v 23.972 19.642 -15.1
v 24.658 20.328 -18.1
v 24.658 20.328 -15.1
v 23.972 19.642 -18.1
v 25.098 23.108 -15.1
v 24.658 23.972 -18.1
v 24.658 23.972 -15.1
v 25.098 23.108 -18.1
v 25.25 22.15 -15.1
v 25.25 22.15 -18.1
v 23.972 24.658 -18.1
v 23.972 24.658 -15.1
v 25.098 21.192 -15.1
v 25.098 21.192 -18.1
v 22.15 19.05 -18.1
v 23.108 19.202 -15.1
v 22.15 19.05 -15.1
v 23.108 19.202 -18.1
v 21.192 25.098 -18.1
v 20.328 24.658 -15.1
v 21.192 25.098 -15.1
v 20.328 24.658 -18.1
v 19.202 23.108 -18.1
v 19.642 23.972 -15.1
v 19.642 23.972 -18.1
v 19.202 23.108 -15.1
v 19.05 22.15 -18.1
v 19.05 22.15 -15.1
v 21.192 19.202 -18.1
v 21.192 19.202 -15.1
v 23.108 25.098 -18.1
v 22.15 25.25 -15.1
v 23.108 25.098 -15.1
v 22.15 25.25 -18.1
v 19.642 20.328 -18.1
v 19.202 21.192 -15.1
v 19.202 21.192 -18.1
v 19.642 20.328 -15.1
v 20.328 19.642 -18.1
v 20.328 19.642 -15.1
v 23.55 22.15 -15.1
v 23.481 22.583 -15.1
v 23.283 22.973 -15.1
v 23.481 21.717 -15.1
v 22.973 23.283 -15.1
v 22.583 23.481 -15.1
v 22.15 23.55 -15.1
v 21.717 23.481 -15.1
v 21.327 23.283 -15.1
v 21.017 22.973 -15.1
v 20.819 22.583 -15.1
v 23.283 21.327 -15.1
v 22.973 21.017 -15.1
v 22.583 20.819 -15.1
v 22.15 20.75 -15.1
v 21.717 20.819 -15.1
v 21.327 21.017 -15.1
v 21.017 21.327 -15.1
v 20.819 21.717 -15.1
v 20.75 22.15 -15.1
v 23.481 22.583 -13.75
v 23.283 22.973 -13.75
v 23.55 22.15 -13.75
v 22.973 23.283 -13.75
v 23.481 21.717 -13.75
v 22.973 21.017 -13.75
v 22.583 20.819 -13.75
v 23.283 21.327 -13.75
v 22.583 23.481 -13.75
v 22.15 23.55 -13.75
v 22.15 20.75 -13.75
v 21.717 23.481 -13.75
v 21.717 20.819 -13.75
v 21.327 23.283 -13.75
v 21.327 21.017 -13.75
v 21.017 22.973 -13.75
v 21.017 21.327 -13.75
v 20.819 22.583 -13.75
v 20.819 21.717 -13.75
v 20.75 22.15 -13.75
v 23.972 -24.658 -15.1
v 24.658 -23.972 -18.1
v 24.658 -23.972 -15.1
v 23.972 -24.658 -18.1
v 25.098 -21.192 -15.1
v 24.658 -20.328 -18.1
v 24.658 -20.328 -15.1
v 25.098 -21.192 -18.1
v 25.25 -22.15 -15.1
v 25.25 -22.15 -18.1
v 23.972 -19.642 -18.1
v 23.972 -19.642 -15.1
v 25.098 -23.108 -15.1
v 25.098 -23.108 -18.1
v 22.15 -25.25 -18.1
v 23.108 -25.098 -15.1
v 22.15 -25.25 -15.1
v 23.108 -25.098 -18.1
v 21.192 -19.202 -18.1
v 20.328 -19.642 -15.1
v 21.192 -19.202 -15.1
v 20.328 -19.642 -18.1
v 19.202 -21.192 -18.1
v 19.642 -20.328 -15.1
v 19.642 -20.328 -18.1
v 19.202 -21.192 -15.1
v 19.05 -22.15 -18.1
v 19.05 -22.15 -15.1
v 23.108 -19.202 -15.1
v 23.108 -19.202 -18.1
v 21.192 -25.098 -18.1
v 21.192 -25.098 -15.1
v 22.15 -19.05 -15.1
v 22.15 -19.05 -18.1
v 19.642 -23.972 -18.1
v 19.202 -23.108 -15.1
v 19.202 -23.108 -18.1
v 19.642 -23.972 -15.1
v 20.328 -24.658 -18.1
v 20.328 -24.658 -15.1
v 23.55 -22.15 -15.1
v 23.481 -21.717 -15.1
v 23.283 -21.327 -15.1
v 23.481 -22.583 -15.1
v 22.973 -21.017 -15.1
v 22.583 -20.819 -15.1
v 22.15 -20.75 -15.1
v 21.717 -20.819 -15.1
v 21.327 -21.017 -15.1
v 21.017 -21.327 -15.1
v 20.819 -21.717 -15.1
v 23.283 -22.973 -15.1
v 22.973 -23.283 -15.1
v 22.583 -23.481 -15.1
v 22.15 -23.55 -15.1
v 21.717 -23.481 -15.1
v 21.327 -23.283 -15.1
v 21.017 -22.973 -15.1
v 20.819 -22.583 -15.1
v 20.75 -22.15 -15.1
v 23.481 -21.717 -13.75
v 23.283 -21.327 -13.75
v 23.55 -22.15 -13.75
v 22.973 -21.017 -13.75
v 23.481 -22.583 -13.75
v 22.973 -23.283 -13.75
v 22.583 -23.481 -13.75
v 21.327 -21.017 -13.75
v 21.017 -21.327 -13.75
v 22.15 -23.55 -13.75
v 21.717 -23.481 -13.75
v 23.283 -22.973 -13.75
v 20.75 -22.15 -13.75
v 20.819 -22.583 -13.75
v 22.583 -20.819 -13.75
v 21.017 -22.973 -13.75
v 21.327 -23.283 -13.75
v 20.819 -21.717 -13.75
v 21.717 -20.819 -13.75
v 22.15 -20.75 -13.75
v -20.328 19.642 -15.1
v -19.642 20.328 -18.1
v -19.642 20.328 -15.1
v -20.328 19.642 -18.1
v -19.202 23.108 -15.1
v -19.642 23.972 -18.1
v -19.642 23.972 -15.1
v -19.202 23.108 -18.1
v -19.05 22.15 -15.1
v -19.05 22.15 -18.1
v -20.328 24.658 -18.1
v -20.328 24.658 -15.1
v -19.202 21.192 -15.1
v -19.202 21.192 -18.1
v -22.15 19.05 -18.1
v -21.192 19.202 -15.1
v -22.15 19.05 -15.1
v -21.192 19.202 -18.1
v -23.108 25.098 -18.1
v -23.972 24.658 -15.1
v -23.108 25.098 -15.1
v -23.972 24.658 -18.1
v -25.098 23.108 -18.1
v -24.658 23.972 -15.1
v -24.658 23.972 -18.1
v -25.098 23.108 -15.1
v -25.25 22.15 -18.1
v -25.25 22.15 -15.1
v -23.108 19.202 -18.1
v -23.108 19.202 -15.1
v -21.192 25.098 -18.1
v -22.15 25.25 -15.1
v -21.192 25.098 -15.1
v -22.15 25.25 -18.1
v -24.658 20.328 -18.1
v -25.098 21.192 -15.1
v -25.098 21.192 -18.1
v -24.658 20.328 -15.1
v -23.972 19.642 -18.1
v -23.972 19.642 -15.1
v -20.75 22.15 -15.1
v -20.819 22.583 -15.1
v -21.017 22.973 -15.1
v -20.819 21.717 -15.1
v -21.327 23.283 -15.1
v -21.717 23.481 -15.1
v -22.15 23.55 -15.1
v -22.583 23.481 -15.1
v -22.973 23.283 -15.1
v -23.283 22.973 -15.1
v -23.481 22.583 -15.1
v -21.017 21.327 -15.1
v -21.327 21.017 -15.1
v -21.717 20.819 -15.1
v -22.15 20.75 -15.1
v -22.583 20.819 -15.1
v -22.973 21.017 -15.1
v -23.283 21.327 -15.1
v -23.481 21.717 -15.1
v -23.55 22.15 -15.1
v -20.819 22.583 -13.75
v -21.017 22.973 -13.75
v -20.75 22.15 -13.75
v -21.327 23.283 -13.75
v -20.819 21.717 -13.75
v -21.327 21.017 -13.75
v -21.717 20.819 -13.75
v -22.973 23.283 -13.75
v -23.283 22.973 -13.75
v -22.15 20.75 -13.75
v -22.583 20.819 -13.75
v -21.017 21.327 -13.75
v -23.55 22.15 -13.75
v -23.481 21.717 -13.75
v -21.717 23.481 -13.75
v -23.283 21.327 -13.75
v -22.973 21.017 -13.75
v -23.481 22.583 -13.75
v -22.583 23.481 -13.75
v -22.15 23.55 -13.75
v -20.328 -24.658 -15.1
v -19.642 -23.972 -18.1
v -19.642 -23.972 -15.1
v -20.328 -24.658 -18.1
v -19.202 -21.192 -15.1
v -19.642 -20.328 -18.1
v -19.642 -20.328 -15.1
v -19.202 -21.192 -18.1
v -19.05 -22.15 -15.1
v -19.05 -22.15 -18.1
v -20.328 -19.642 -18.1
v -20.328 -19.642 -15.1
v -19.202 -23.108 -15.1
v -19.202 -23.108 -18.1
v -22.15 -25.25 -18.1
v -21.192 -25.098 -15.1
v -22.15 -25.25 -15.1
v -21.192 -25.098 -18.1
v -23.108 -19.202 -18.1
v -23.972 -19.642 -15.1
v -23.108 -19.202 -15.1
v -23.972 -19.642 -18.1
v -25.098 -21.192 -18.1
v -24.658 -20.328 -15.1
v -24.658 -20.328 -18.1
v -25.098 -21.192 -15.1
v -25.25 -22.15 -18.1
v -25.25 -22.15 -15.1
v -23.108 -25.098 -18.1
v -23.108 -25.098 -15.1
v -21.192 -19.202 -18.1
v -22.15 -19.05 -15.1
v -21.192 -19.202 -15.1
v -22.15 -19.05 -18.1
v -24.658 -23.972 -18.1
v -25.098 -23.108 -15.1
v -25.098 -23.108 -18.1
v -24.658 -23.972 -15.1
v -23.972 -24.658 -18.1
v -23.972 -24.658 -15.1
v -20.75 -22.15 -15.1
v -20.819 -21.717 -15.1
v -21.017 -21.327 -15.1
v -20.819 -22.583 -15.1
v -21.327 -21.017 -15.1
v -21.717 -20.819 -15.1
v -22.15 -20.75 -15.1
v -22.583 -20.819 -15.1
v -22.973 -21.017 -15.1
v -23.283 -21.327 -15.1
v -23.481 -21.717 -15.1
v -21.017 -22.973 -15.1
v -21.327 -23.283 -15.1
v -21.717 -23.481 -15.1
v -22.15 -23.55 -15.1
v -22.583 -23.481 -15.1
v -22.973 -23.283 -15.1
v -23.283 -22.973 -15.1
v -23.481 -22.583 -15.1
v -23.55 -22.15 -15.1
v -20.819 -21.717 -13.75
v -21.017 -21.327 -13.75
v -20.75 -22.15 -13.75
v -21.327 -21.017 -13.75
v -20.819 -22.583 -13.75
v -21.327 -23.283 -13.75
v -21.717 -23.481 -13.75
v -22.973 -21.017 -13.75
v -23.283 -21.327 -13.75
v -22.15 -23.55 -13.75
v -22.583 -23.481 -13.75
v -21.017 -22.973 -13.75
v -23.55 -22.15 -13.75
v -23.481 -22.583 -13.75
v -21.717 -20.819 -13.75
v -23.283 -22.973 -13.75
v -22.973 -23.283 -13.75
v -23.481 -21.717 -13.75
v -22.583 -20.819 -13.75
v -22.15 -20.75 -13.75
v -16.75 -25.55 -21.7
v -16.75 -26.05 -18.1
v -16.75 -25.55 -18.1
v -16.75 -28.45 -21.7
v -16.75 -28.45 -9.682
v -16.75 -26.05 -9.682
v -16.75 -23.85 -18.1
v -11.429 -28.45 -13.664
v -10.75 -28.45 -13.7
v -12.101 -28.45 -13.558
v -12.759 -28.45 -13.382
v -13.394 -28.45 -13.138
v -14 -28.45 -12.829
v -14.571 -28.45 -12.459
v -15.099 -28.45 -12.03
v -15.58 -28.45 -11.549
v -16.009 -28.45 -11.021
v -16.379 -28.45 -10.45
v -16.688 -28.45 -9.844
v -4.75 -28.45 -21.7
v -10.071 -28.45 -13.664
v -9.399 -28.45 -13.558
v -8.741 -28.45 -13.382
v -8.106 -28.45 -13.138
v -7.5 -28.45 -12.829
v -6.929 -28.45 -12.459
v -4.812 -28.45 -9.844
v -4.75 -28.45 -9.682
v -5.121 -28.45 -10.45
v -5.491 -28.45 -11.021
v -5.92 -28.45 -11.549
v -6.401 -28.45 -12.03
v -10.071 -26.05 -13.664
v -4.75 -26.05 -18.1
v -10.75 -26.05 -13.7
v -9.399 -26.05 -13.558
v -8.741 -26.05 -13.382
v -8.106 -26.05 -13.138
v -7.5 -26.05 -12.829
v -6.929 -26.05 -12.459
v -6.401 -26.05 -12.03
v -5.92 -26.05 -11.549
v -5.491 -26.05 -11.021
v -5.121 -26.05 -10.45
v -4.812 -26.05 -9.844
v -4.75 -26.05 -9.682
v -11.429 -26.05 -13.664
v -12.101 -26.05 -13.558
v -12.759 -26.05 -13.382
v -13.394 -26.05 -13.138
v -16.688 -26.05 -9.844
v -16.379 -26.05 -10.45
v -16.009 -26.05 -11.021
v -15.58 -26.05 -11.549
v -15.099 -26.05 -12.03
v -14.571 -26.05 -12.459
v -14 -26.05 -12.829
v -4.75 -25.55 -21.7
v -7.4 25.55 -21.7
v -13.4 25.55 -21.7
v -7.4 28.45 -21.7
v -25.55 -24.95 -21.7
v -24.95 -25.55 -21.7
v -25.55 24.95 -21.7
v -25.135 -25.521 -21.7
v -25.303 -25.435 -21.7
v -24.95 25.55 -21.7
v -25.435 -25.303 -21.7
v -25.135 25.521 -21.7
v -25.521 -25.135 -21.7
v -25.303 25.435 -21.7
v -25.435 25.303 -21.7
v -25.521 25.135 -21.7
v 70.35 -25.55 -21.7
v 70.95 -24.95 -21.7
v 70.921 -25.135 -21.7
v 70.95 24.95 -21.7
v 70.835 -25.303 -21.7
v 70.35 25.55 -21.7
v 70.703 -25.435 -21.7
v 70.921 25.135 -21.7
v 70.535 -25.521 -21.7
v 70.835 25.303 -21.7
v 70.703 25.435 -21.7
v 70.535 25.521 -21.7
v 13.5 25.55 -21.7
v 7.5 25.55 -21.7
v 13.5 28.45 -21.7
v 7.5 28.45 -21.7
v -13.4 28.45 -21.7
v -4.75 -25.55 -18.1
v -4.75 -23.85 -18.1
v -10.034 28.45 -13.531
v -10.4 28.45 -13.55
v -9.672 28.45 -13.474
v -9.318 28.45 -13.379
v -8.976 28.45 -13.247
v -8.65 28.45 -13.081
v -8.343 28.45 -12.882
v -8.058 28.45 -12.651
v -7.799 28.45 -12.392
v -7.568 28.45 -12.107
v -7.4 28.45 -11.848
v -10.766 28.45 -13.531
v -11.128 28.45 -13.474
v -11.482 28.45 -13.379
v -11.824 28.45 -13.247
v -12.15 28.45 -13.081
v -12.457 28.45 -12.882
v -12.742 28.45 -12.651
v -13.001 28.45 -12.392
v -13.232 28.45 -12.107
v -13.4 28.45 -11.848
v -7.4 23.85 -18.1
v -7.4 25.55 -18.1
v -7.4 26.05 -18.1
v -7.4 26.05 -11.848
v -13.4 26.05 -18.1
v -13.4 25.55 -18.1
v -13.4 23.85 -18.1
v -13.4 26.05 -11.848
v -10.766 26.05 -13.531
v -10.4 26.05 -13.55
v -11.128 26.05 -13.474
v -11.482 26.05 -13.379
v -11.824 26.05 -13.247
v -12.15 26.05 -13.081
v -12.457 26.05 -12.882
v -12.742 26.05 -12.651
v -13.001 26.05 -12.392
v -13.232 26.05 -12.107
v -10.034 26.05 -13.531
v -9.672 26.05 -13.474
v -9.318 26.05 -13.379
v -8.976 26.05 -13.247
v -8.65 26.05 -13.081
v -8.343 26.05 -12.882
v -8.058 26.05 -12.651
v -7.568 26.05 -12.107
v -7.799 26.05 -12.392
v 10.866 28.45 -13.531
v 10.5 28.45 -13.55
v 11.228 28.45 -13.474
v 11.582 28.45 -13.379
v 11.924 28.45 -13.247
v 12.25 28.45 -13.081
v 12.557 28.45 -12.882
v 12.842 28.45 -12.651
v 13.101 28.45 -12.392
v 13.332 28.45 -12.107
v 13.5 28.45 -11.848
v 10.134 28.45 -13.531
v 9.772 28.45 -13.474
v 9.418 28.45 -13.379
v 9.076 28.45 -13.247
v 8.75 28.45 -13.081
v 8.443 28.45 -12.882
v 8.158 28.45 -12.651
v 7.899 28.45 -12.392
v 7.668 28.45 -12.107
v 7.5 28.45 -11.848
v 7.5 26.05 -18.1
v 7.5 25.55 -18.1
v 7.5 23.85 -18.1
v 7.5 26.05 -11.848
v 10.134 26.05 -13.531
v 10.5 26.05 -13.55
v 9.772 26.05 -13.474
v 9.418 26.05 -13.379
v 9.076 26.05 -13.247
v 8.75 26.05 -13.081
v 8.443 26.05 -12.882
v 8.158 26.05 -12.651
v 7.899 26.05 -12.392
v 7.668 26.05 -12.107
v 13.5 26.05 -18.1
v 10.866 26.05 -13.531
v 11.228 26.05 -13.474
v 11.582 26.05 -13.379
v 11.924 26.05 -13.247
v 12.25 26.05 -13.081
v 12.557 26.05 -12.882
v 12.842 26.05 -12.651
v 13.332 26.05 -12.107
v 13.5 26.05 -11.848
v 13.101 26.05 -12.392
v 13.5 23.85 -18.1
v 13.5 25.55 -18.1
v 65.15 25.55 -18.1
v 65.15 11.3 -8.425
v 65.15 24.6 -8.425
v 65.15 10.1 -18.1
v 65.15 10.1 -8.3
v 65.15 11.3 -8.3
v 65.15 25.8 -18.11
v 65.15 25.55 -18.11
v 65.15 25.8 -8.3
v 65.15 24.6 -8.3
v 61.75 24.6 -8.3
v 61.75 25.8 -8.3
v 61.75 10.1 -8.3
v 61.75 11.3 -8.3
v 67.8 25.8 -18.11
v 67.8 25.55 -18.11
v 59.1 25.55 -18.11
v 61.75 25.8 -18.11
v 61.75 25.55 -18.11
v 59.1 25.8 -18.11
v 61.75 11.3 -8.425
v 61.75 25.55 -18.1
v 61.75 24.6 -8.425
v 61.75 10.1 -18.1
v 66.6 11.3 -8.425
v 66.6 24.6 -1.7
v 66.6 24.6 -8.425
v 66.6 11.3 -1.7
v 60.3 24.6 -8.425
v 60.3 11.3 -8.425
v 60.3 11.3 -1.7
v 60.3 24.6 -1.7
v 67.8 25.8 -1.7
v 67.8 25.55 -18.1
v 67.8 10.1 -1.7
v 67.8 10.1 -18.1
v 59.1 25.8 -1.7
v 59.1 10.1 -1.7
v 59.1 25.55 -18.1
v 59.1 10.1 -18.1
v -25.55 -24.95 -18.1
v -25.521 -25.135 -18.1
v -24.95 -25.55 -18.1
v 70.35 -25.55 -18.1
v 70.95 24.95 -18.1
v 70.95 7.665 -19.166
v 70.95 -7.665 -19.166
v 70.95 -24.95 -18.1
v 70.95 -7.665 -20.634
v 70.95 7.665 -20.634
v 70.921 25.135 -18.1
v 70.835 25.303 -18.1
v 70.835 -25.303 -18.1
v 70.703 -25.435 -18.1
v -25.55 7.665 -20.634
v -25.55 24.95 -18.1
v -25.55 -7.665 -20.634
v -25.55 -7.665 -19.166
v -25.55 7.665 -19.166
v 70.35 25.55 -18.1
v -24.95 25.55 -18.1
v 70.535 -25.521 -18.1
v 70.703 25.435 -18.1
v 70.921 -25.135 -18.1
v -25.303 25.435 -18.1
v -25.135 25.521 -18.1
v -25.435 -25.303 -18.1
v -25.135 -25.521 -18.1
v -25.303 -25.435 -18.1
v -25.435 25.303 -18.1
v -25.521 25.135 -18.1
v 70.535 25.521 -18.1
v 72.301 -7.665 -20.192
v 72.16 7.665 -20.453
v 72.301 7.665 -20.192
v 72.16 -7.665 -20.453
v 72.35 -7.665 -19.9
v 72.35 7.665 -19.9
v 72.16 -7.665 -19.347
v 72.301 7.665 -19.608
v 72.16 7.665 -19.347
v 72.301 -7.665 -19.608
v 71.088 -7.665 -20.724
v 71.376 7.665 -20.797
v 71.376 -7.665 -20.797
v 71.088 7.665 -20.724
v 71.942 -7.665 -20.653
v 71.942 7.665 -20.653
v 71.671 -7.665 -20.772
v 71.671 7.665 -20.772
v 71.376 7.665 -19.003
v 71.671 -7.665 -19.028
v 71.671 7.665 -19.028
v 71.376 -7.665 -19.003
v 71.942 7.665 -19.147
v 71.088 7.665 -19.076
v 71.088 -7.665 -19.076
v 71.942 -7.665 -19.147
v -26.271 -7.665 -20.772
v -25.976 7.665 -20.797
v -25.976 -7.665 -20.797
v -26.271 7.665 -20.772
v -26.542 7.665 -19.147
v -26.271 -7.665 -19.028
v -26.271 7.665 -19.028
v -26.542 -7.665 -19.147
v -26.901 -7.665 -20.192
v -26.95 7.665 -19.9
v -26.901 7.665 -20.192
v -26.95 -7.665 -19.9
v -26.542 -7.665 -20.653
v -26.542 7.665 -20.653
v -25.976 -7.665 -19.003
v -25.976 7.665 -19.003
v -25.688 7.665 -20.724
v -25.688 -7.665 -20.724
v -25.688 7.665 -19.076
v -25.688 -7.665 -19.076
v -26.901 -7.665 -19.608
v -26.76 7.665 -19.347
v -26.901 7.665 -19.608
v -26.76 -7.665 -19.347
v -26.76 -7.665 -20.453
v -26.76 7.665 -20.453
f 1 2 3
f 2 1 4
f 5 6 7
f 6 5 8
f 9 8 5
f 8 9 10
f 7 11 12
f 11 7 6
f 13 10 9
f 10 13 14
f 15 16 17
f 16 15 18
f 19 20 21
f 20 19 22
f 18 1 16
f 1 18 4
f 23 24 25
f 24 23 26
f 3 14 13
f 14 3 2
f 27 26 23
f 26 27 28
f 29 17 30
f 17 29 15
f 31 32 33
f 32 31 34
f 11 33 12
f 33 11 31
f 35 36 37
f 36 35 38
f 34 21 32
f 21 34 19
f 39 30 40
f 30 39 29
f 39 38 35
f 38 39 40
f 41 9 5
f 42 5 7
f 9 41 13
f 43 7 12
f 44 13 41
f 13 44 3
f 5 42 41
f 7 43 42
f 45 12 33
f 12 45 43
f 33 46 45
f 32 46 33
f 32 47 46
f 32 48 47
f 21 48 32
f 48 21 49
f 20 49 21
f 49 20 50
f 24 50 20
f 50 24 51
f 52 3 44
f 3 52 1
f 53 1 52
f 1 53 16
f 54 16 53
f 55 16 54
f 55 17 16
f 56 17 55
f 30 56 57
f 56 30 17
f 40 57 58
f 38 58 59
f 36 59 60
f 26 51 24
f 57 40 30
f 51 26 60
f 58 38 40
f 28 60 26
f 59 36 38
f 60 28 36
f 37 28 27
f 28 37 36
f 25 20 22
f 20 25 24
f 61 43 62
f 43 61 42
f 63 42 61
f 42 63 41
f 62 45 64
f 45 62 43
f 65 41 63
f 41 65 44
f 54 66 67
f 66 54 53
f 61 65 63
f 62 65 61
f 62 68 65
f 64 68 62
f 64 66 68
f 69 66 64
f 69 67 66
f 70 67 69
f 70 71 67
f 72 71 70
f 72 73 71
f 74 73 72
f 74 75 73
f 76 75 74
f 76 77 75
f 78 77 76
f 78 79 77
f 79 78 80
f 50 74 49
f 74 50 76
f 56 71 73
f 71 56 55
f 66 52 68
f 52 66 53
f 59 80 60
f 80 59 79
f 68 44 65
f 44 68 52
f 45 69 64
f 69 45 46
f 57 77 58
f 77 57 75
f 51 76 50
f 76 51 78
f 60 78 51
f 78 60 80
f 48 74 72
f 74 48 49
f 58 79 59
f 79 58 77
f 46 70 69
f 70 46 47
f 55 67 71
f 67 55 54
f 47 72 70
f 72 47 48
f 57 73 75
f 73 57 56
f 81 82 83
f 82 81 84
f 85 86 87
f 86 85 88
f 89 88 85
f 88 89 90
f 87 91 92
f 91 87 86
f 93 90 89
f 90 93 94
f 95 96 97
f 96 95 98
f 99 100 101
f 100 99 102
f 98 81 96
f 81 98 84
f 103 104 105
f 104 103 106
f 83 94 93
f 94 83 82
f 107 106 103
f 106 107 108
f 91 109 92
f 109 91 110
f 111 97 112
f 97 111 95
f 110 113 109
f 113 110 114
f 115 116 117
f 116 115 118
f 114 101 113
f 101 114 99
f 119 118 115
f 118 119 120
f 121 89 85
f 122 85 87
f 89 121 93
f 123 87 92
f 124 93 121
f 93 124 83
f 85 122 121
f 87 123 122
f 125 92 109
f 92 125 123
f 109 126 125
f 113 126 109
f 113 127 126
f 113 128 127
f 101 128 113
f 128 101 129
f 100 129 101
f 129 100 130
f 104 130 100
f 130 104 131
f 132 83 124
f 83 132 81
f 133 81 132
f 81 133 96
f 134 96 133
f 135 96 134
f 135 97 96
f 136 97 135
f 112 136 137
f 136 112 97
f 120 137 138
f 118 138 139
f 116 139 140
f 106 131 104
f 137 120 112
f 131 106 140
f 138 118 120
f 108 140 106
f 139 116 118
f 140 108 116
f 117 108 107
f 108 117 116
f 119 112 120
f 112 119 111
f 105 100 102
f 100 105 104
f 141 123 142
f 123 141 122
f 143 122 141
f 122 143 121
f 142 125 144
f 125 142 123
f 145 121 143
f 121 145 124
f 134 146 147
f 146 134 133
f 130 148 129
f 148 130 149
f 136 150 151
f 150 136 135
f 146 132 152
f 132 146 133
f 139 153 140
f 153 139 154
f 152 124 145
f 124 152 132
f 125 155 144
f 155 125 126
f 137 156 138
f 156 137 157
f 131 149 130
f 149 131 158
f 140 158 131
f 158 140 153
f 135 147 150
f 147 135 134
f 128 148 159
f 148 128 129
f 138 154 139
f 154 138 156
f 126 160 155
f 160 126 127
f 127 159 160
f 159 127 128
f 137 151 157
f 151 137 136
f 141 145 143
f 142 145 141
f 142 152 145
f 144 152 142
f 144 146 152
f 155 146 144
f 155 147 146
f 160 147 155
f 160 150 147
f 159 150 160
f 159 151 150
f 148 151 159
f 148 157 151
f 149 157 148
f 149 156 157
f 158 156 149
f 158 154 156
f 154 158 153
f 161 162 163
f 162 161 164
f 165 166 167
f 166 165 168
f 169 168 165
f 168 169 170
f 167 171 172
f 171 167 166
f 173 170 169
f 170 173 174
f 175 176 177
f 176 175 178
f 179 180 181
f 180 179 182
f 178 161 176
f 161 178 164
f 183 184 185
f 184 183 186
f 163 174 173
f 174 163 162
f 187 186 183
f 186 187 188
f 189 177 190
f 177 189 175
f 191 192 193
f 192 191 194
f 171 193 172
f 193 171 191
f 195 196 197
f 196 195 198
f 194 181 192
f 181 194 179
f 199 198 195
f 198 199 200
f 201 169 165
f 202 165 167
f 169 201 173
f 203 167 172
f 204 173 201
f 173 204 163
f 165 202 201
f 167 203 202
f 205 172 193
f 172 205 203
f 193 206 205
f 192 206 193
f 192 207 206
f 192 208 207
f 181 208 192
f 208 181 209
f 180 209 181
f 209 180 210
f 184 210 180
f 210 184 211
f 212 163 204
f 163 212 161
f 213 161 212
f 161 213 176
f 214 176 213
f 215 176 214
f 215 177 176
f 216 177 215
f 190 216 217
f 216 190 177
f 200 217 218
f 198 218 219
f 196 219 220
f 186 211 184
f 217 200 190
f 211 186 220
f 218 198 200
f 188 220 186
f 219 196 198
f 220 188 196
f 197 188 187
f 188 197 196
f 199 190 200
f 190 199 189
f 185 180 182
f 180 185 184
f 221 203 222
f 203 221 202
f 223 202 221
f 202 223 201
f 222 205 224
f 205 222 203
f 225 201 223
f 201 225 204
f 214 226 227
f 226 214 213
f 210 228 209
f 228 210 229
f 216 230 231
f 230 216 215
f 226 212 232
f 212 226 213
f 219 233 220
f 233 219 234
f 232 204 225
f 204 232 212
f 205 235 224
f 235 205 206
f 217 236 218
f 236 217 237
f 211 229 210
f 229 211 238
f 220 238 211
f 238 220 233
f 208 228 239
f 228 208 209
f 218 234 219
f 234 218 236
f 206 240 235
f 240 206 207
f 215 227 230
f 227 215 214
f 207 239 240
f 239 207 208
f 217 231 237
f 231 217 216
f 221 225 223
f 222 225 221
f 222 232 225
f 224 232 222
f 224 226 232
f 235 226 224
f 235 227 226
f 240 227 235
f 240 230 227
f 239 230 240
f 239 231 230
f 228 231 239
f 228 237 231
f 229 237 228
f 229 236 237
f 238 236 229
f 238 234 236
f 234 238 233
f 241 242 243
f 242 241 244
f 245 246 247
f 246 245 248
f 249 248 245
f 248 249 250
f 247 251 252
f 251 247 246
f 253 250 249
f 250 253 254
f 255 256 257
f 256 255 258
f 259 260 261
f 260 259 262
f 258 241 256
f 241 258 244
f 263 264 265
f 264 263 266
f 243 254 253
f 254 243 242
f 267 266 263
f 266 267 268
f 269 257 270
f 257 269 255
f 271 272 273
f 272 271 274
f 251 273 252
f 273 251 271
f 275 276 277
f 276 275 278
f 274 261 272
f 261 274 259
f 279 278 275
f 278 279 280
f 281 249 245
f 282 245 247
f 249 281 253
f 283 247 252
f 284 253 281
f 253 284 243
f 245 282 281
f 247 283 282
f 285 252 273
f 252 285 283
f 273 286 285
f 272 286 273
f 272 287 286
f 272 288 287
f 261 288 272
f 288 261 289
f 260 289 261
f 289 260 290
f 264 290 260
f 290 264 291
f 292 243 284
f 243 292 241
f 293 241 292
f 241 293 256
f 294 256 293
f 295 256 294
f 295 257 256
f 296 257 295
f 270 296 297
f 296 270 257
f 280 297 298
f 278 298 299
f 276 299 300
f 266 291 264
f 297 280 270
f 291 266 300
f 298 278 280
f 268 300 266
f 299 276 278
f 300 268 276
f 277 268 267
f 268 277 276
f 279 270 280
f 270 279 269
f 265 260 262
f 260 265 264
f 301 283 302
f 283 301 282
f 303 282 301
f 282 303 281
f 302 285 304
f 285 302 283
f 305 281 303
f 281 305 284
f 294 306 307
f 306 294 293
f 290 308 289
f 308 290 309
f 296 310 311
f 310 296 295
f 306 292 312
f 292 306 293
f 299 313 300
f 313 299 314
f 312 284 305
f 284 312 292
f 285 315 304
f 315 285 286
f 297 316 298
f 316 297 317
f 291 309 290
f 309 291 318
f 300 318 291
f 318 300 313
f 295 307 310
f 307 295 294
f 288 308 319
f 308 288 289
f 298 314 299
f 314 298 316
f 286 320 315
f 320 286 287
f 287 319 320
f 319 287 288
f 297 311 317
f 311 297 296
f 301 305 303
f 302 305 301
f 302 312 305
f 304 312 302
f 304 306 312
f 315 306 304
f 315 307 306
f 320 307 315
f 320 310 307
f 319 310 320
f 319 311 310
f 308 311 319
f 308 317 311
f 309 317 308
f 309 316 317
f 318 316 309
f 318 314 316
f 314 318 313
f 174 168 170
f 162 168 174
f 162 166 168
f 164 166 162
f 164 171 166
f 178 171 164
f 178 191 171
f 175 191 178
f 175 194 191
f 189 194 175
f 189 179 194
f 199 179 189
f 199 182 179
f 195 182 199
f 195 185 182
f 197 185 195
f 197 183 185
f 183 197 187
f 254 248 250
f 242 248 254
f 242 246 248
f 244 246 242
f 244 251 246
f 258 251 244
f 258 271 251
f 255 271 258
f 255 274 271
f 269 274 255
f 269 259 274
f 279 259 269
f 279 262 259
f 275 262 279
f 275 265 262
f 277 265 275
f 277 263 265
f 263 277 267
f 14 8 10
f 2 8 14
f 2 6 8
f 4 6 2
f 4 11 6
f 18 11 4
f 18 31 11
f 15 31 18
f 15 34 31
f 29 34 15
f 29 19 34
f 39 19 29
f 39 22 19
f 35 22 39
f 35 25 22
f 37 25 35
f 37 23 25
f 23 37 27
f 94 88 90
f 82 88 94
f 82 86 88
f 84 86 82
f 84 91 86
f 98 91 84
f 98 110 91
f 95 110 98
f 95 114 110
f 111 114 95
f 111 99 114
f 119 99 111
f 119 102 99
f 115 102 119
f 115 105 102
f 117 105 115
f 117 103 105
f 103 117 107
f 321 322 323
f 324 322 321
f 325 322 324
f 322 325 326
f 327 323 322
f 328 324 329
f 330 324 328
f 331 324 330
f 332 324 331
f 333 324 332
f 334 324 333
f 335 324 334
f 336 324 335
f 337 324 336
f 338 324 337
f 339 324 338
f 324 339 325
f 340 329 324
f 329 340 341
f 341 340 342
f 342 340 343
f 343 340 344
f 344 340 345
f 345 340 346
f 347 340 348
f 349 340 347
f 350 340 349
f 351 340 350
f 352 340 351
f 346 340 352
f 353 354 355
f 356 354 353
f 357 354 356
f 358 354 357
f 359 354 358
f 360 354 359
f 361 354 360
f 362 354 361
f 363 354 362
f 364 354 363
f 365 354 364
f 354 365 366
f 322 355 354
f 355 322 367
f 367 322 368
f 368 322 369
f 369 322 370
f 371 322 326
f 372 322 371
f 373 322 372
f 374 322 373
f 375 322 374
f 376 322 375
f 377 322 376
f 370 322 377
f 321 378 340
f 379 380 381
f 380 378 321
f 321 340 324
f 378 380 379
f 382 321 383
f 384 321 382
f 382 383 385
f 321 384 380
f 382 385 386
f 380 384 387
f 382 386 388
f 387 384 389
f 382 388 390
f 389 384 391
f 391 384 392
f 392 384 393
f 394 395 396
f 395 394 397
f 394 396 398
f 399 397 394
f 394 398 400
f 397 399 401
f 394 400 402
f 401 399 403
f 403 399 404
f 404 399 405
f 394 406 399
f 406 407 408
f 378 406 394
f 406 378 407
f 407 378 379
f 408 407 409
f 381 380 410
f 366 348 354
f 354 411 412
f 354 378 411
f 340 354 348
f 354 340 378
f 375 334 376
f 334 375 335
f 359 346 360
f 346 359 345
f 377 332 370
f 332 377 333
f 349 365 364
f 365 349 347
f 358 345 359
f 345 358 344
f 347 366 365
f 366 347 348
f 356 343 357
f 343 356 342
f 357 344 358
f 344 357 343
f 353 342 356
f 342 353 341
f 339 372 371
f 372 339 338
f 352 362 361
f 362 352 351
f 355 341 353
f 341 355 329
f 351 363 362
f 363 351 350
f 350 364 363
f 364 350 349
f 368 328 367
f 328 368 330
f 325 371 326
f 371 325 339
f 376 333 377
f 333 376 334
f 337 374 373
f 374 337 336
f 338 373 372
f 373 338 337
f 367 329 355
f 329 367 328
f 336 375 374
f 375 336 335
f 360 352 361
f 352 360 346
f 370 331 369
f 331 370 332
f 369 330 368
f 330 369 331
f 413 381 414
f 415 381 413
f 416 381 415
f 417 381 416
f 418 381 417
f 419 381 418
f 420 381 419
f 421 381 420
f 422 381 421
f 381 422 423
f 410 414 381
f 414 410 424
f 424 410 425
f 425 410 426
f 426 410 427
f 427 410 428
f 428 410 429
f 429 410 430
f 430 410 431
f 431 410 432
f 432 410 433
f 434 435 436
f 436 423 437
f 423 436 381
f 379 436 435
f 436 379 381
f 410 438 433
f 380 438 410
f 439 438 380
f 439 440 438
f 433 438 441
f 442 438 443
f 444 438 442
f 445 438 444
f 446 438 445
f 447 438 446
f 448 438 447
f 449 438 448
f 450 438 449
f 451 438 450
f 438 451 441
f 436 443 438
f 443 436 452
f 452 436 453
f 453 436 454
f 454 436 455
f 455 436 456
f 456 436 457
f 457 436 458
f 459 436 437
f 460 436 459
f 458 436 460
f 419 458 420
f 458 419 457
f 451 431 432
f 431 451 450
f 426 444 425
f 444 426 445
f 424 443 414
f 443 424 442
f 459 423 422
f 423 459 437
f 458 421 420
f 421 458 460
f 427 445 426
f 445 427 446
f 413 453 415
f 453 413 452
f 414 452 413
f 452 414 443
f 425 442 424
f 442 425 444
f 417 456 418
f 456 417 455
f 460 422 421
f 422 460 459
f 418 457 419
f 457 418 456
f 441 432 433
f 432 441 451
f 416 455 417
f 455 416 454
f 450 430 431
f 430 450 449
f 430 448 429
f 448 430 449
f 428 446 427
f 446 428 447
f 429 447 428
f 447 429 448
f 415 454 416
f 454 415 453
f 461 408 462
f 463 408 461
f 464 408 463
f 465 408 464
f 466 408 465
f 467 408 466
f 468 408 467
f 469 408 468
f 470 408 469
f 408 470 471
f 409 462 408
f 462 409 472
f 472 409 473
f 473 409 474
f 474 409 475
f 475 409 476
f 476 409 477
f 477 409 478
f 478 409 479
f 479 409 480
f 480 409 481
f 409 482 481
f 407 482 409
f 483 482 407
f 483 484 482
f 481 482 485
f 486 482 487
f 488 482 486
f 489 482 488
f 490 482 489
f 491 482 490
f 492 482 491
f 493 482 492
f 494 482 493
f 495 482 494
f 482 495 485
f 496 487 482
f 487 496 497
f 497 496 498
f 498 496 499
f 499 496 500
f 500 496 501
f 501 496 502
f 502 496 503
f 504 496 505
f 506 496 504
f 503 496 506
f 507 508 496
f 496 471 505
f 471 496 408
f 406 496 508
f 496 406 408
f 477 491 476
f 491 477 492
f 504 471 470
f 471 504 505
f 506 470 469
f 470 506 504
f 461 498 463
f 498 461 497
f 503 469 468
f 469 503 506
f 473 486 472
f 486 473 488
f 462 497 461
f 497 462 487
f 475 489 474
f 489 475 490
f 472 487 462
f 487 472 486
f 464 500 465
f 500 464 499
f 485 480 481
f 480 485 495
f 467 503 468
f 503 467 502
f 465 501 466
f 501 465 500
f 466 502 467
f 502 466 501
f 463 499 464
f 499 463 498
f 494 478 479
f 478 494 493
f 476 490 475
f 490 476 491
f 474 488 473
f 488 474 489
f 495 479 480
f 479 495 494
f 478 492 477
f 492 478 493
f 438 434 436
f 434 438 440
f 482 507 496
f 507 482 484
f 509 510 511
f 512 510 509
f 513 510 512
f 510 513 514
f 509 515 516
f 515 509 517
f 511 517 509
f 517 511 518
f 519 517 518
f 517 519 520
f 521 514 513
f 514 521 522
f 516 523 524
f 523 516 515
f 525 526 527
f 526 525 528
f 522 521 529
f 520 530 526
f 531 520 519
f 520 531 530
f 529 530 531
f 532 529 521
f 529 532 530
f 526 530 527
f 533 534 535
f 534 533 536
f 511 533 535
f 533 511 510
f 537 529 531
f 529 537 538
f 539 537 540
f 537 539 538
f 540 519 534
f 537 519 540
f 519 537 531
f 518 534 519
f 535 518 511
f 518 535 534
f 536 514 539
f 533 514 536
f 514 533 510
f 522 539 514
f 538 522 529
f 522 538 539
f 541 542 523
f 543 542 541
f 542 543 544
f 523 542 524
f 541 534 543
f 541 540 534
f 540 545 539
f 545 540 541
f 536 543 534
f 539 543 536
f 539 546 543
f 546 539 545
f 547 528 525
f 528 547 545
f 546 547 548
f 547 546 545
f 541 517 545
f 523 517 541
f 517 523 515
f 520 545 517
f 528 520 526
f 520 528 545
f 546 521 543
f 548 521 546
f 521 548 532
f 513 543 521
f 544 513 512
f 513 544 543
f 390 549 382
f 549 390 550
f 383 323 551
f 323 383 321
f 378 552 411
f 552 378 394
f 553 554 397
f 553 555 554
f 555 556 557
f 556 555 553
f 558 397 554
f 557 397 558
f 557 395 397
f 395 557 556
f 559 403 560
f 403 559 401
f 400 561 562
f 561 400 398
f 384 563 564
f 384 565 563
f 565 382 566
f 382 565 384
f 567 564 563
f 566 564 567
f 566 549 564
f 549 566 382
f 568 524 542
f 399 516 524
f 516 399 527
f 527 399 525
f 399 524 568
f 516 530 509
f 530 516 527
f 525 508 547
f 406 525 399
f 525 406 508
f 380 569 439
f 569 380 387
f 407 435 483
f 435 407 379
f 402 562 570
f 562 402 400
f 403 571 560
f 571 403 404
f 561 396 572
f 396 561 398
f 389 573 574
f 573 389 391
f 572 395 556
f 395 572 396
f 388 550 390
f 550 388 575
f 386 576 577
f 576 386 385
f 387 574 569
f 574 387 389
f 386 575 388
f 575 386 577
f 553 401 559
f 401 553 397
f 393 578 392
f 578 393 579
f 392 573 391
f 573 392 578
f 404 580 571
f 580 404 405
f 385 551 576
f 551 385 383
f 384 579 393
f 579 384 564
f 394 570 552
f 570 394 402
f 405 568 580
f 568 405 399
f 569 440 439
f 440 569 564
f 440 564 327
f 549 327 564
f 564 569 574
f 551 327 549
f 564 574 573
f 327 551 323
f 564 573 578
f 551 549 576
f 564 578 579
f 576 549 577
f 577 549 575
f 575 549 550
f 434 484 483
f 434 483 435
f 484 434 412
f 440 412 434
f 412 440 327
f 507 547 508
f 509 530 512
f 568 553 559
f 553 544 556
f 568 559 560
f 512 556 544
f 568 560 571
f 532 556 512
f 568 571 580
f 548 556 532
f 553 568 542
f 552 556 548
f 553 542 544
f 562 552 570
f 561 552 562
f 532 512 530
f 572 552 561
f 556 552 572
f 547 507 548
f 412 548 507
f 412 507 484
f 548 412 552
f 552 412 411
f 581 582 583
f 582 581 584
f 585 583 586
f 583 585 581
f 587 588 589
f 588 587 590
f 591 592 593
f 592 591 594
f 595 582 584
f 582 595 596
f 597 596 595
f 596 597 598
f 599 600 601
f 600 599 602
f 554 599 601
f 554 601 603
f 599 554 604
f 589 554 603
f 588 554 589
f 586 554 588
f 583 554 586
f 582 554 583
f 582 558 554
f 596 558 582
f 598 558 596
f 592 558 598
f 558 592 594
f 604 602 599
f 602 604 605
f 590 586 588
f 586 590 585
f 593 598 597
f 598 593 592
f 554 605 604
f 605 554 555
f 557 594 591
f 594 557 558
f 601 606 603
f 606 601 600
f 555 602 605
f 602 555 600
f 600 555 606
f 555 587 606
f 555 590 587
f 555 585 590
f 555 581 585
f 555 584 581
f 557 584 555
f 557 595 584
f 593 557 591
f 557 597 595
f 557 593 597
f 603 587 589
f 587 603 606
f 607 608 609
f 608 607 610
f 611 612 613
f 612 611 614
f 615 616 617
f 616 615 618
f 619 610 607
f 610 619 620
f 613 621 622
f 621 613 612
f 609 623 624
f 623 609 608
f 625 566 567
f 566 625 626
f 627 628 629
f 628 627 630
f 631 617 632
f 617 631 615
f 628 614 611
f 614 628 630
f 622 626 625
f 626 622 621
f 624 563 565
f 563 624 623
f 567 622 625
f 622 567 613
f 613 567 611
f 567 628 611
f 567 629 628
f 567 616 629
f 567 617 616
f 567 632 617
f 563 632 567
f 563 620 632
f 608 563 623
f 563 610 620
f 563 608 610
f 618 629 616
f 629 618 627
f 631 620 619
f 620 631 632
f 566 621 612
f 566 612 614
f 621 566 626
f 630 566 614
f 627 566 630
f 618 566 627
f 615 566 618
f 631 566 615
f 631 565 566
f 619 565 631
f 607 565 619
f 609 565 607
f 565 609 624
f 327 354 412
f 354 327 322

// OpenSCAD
//
//  case for "pixie" 2 transistor 40 m band transceiver
//
//  design by Egil Kvaleberg, 8 Jun 2015
//
//  note:
//  design origin is center of pcb, underside of top cover surface

part = "bottom"; // [ demo, all, top, bottom, key, ring ]
with_battery = 1; // [ 1:true, 0:false ] 
with_key = 1; // [ 1:true, 0:false ] 

uswitch_width = 5.8; // microswitch case width
uswitch_depth = 12.8; // microswitch case depth
uswitch_height = 6.6; // microswitch case height
key_travel = 1.0; // microswitch switch travel, with some margin

/* [Hidden] */
batt = [26.0, 53.0, 17.0]; // 

pcb = [51.1, 51.1, 1.6];

pcbmntdia = 3.8; // net
pcbmntdx = 40.5 + pcbmntdia;
pcbmntdy = 40.5 + pcbmntdia;

pcb2bot = 3.0; // room from bottom pcb to bottom cover
pcb2top = 13.5; // room from top pcb to top cover

bncdia = 12.0;
bncpos = (7.5+14.6/2)-pcb[0]/2; // from lower r corner 
bncheight = 12.0/2 + 0.3; // height of centre from top PCB

jackdia = 6.0;
jack1pos = (9.4+11.5/2)-pcb[0]/2; 
jack2pos = pcb[0]/2-(9.3+11.5/2); 
jackheight = 6.6/2 + 0.15; // height of centre from top PCB

powerpos = pcb[0]/2-(10.6+8.9/2); 
powerdx = 1*9.0;
powerdz = 1*11.0;

trimpos = [pcb[0]/2-21.8, pcb[1]/2-21.0];
trimdia = 5.5;
trimhgt = 8.0;

snap_dia = 1.8; // snap lock ridge diameter
snap_len_y = pcb[1]*0.3; // snap lock length
snap_len_x = pcb[0]*0.3;

key_x = 12;
key_y = 25;
uswitch = [uswitch_width, uswitch_depth, uswitch_height];

wall = 1.2;
caser = wall;
twall = 1.2; // wall size of top 
bwall = 3.6; // wall size of bottom 

tol = 0.5;
d = 0.01;


extra_x = (with_battery ? batt[0]+wall+2*tol : 0) + (with_key ? key_x+wall+8*tol : 0); // extra space in X

module nut(af, h) { // af is 2*r
	cylinder(r=af/2/cos(30), h=h, $fn=6);
}

module c_cube(x, y, z) {
	translate([-x/2, -y/2, 0]) cube([x, y, z]);
}

module cr_cube(x, y, z, r) {
	hull() {
		for (dx=[-1,1]) for (dy=[-1,1]) translate([dx*(x/2-r), dy*(y/2-r), 0]) cylinder(r=r, h=z, $fn=20);
	}
}

module cr2_cube(x, y, z, r1, r2) {
	hull() {
		for (dx=[-1,1]) for (dy=[-1,1]) translate([dx*(x/2-r1), dy*(y/2-r1), 0]) cylinder(r1=r1, r2=r2, h=z, $fn=20);
	}
}

module snap2(adia, alen) {
		translate([pcb[0]/2+tol, -(snap_len_y+alen)/2, -(pcb2top+pcb[2]+pcb2bot+bwall/2)]) rotate([-90, 0, 0]) cylinder(r=(snap_dia+adia)/2, h=snap_len_y+alen, $fs=0.3);
		//translate([-(snap_len_x+alen)/2, pcb[1]/2+tol, -(pcb2top+pcb[2]+pcb2bot+bwall/2)]) rotate([0, 90, 0]) cylinder(r=(snap_dia+adia)/2, h=snap_len_x+alen, $fs=0.3);
}

//uswitch = [5.8, 12.8, 6.6]
module uswitch_bed() { // microswitch bed 
	h = d+pcb2bot+pcb[2]+pcb2top-tol-twall;
	if (with_key) {
		translate([pcb[0]/2+tol+(with_battery ? wall+batt[0]+2*tol : 0)+wall+4*tol+key_x/2, pcb[1]/2 - uswitch[1]/2-wall, -(d+pcb2bot+pcb[2]+pcb2top)])
			difference () {
				c_cube(uswitch[0]+tol+2*wall, uswitch[1]+tol+2*wall, h); // mounting bed outer
				union () {
					c_cube(uswitch[0]-2*wall, uswitch[1]+tol+2*wall+2*d, h-uswitch[2]); // room for contacts and wires
					translate([0, 0, h-uswitch[2]-tol/4]) c_cube(uswitch[0]+tol, uswitch[1]+tol, uswitch[2]+tol); // mounting hole
				}
			}
	}
}

peglen = 3* wall; // length beyond key 
pegsiz = pcb[1]*0.1; // BUG: subst

module ring() { // lock ring
	flex = 2.0;
	difference () {
		union () {
			cylinder(h=wall, r=pegsiz/2 + wall, $fn=32);
			translate([pegsiz/2+wall*0.3, (pegsiz-flex)/2+1.5*wall, 0]) cylinder(h=wall, r=1.5*wall, $fn=16);
			translate([pegsiz/2+wall*0.3, -(pegsiz-flex)/2-1.5*wall, 0]) cylinder(h=wall, r=1.5*wall, $fn=16);
		}
		translate([0, 0, -d]) {
			cylinder(h=wall+2*d, r=pegsiz/2, $fn=32);
			translate([pegsiz/2, 0, 0]) c_cube(pegsiz, pegsiz-flex, wall+2*d);
			translate([pegsiz/2+wall*0.3, (pegsiz-flex)/2+1.5*wall, 0]) cylinder(h=wall+2*d, r=0.7*wall, $fn=16);
			translate([pegsiz/2+wall*0.3, -(pegsiz-flex)/2-1.5*wall, 0]) cylinder(h=wall+2*d, r=0.7*wall, $fn=16);
		}
	}
}

module mkey_peg(air) { // morse key mounting peg
	if (with_key) {
		translate([pcb[0]/2+tol+(with_battery ? wall+batt[0]+2*tol : 0)+wall+4*tol+key_x/2, -pcb[1]*0.4, -air-wall-peglen-tol]) {
			if (air != 0) {
				c_cube(pcb[1]*0.1+air, pcb[1]*0.1+air, air+peglen+wall+tol+d); // mounting hole
			} else {
				cylinder(r=pegsiz/2, h=air+peglen+wall+tol+d, $fn=32); // mounting hole
				c_cube(pcb[1]*0.1+air, pcb[1]*0.1+air, air+peglen-wall-tol); // mounting hole
				translate([0, 0, air+peglen]) c_cube(pcb[1]*0.1+air, pcb[1]*0.1+air, wall+tol+d); // mounting hole
			}
		}
	}
}

module mkey_support() { // morse key support (towards mounting peg) 
	if (with_key) difference () {
		translate([pcb[0]/2+tol+(with_battery ? wall+batt[0]+2*tol : 0)+wall+4*tol+key_x/2, -pcb[1]*0.4, -(d+pcb2bot+pcb[2]+pcb2top)])
				c_cube(pcb[1]*0.1+2*tol+2*wall, pcb[1]*0.1+2*tol*2*wall, d+pcb2bot+pcb[2]+pcb2top-tol-twall); // mounting hole
		mkey_peg(tol);
	}
}

module mkey(air) { // morse key
	module curve() {
		r = 25.0 / 2; // a bit more than a typical human finger
		if (air == 0) translate([0, key_y/2 + d, twall+tol+twall+sqrt(pow(r,2) - pow(key_x/2-wall,2))]) rotate([90, 0, 0]) {
			cylinder(r=r, h=d+key_y-key_x/2, $fn=80);
			translate([0, 0, d+key_y-key_x/2]) sphere(r=r, $fn=80);
		}
	}
	if (with_key) {
		translate([pcb[0]/2+tol+(with_battery ? wall+batt[0]+2*tol : 0)+wall+4*tol+key_x/2, pcb[1]/2+tol+wall - key_y/2, -twall-tol]) {
			translate([0, -(wall+tol), 0]) 
				c_cube(key_x+6*tol, key_y, twall); // base frame, covering air gap on sides
			difference() {
				union () {
					translate([0, -(wall+tol)/2, 0])	c_cube(key_x, key_y-(wall+tol), twall+tol+twall); // body
					translate([0, 0, key_travel]) c_cube(key_x+2*air, key_y+2*air, twall+tol+twall-key_travel); //top, extending to edge of case BUG: build issues
				}
				curve();
			}
			if (air != 0) c_cube(key_x+2*air, key_y+2*air, twall+tol+twall+d); // opening in front
			
		}
		if (air == 0) difference () { // arm
			translate([pcb[0]/2+tol+(with_battery ? wall+batt[0]+2*tol : 0)+wall+4*tol+key_x/2, 0, -twall-tol])c_cube(key_x*0.8, pcb[1], twall); // arm
			mkey_peg(tol); // mounting hole
		}
	}
}

module top() {
	sidewalls();

	difference() {
		union() {
			// lid
			translate([extra_x/2, 0, 0]) 
				cr_cube(pcb[0]+2*wall+2*tol+extra_x, pcb[1]+2*wall+2*tol, twall, caser);

			// PCB upper supports
			for (dx=[pcbmntdx/2, -pcbmntdx/2]) for (dy=[pcbmntdy/2, -pcbmntdy/2]) {
				// 
				translate([dx, dy, -(pcb2top-tol)]) {
					cylinder(r1=pcbmntdia/2+wall, r2=pcbmntdia/2+2.5*wall, h=pcb2top, $fn=20);
				}
			}
			// trimmer access tube 
			translate([trimpos[0], trimpos[1], -(pcb2top-trimhgt-tol)]) 
				cylinder(r=trimdia/2+tol/2+wall, r2=trimdia/2+tol/2+2*wall, h=(pcb2top-trimhgt-tol)+d, $fn=20);
			// morse key mounting peg, if applicable
			mkey_peg(0);  

		}
		union () { // subtract:
			// hole for trimmer 
			translate([trimpos[0], trimpos[1], -pcb2top]) {
				cylinder(r=trimdia/2+tol/2, h=pcb2top+twall+d, $fn=20);
			}
			translate([trimpos[0], trimpos[1], 0]) {
				cylinder(r1=trimdia/2+tol/2, r2=trimdia/2+tol/2+wall, h=twall+d, $fn=20);
			}
			// hole for key
			mkey(tol);
		}
	}

	//color("red") mkey(0);	 
}

module sidewalls() {
	difference() {
		union () { // add:
			translate([extra_x/2, 0, /*-(bwall+pcb2bot+pcb[2]+pcb2top)*/twall]) {
				rotate([180, 0, 0]) 
				cr2_cube(pcb[0]+2*wall+2*tol+extra_x, pcb[1]+2*wall+2*tol, (bwall+pcb2bot+pcb[2]+pcb2top+twall), caser, caser+wall);
			}
		}
		union() { // subtract:
			translate([extra_x, 0, 0]) snap2(tol/2, 2*tol);
			rotate([0,0,180]) snap2(tol/2, 2*tol);
			// room for bottom lid
			translate([extra_x/2, 0, -pcb2bot-pcb[2]-pcb2top-bwall-d]) cr_cube(pcb[0]+2*tol+extra_x, pcb[1]+2*tol, d+bwall+tol, caser/2); 
			// room for everything in top wall
			translate([extra_x/2, 0, -d]) cr_cube(pcb[0]+2*wall+4*tol+extra_x, pcb[1]+2*wall+4*tol, twall+2*d, caser+tol);
			// room for pcb
			translate([0, 0, -pcb2bot-pcb[2]-pcb2top]) c_cube(pcb[0]+2*tol, pcb[1]+2*tol, pcb2bot+pcb[2]+pcb2top+d); 
			// room for battery
			if (with_battery) translate([pcb[0]/2+tol+wall+batt[0]/2+tol, 0, -pcb2bot-pcb[2]-pcb2top]) c_cube(batt[0]+2*tol, pcb[1]+2*tol, pcb2bot+pcb[2]+pcb2top+d); 
			// room for key mechanism and key
			if (with_key) translate([pcb[0]/2+tol+(with_battery ? wall+batt[0]+2*tol : 0)+wall+4*tol+key_x/2, 0, -pcb2bot-pcb[2]-pcb2top]) c_cube(key_x+8*tol, pcb[1]+2*tol, pcb2bot+pcb[2]+pcb2top+d);
			mkey(tol);

			// BNC hole
			translate([bncpos, -pcb[1]/2, -pcb2top+bncheight]) rotate([90,0,0]) {
				cylinder(r=bncdia/2+tol, h=tol+2*wall, $fn=60); 
				// also cut out bottom...
				translate([0, -20.0/2, 0]) c_cube(bncdia+2*tol, 20.0, tol+2*wall);
			}
			// jack holes
			for (dx = [jack1pos, jack2pos]) translate([dx, pcb[1]/2, -pcb2top+jackheight]) rotate([-90,0,0]) {
				cylinder(r=jackdia/2+tol, h=tol+2*wall, $fn=60); 
				// also cut out bottom...
				translate([0, 20.0/2, 0]) c_cube(jackdia+2*tol, 20.0, tol+2*wall);
			}

			// hole for power plug
			translate([powerpos, -pcb[1]/2, -pcb2top+powerdz/2]) rotate([90,0,0]) c_cube(powerdx+2*tol, powerdz+2*tol, tol+2*wall);

			// holes for wires through inner wall
			for (dy= [pcb[1]/2+tol-7.0/2, -(pcb[1]/2+tol-7.0/2)]) {
				if (with_battery) translate([pcb[0]/2, dy, -pcb2top+1.5]) rotate([0, 90, 0]) cylinder(r=7.0/2, h = 2*tol+wall); 
				if (with_key) translate([pcb[0]/2+(with_battery ? batt[0]+wall+2*tol : 0), dy, -pcb2top+1.5]) rotate([0, 90, 0]) cylinder(r=7.0/2, h = 2*tol+wall);
			}
			// hole for power switch
			if (with_key && with_battery) translate([pcb[0]/2+batt[0]+2*wall+7*tol+key_x/2, -pcb[1]/2, -pcb2top+0.0]) rotate([90, 0, 0]) cylinder(r=7.0/2, h = tol+2*wall, $fn=30);
		}
	}

}

module bottom() {
	module support(dx, dy) {
		translate([dx, dy, -(d+pcb2bot+pcb[2]+pcb2top)]) {
			cylinder(r=pcbmntdia/2+wall, h=d+pcb2bot, $fn=20);
			cylinder(r=pcbmntdia/2-tol, h=d+pcb2bot+pcb[2]-tol/2, $fn=20);
		}
	}

	// bottom lid
	translate([extra_x/2, 0, -(bwall+pcb2bot+pcb[2]+pcb2top)]) {
		cr_cube(pcb[0]+extra_x, pcb[1], bwall, caser/2);
	}
	translate([extra_x, 0, 0]) snap2(0, 0);
	rotate([0,0,180]) snap2(0, 0);
	intersection () {
		translate([0, 0, -(pcb2bot+pcb[2]+pcb2top)]) {
			cr_cube(pcb[0], pcb[1], pcb2bot+pcb[2], caser/2);
		}
		union () {	
			for (dx=[pcbmntdx/2, -pcbmntdx/2]) for (dy=[pcbmntdy/2, -pcbmntdy/2]) {
				support(dx, dy);	
			}
		}
	}

	// BNC lower part, minus hole
	translate([bncpos, -pcb[1]/2, -pcb2top-pcb[2]-pcb2bot-bwall]) c_cube(bncdia, 2*(tol+wall), bwall);
	difference () {
		translate([bncpos, -pcb[1]/2-tol, -pcb2top-pcb[2]-pcb2bot-bwall+(pcb2bot+bwall+bncheight)/2]) rotate([90,0,0]) c_cube(bncdia, (pcb2bot+bwall+bncheight), 2*wall); 
		translate([bncpos, -pcb[1]/2, -pcb2top+bncheight]) rotate([90,0,0]) cylinder(r=bncdia/2+tol, h=tol+2*wall+d, $fn=60); 
	}
   // jack lower part, minus hole
	for (dx = [jack1pos, jack2pos]) {
		translate([dx, pcb[1]/2, -pcb2top-pcb[2]-pcb2bot-bwall]) c_cube(jackdia, 2*(tol+wall), bwall);
		difference () {
			translate([dx, pcb[1]/2+tol, -pcb2top-pcb[2]-pcb2bot-bwall+(pcb2bot+bwall+jackheight)/2]) rotate([-90,0,0]) c_cube(jackdia, (pcb2bot+bwall+jackheight), 2*wall); 
			translate([dx, pcb[1]/2, -pcb2top+jackheight]) rotate([-90,0,0]) cylinder(r=jackdia/2+tol, h=tol+2*wall+d, $fn=60);
		} 
	}
	// morse key support peg, replaced by lock ring 
	if (false) mkey_support();
   // microswitch bed
	uswitch_bed();
}


if (part=="demo") {
	color("red") mkey(0);
	top();
}
if (part=="top") rotate([180, 0, 0]) top();

if (part=="demo" || part=="bottom") bottom();

if (part=="demo") color("green") {
	translate([-pcb[0]/2, -pcb[1]/2, -pcb2top-pcb[2]]) cube(pcb); 
}

if (part=="key") mkey(0);
if (part=="ring") ring(0);

if (part=="all") {
	translate([-pcb[0]/2-wall-4, 0, bwall]) rotate([0, 180, 0]) top();
	translate([pcb[0]/2+wall+4, 0, pcb2top+pcb[2]+pcb2bot+wall+tol]) bottom();
}


